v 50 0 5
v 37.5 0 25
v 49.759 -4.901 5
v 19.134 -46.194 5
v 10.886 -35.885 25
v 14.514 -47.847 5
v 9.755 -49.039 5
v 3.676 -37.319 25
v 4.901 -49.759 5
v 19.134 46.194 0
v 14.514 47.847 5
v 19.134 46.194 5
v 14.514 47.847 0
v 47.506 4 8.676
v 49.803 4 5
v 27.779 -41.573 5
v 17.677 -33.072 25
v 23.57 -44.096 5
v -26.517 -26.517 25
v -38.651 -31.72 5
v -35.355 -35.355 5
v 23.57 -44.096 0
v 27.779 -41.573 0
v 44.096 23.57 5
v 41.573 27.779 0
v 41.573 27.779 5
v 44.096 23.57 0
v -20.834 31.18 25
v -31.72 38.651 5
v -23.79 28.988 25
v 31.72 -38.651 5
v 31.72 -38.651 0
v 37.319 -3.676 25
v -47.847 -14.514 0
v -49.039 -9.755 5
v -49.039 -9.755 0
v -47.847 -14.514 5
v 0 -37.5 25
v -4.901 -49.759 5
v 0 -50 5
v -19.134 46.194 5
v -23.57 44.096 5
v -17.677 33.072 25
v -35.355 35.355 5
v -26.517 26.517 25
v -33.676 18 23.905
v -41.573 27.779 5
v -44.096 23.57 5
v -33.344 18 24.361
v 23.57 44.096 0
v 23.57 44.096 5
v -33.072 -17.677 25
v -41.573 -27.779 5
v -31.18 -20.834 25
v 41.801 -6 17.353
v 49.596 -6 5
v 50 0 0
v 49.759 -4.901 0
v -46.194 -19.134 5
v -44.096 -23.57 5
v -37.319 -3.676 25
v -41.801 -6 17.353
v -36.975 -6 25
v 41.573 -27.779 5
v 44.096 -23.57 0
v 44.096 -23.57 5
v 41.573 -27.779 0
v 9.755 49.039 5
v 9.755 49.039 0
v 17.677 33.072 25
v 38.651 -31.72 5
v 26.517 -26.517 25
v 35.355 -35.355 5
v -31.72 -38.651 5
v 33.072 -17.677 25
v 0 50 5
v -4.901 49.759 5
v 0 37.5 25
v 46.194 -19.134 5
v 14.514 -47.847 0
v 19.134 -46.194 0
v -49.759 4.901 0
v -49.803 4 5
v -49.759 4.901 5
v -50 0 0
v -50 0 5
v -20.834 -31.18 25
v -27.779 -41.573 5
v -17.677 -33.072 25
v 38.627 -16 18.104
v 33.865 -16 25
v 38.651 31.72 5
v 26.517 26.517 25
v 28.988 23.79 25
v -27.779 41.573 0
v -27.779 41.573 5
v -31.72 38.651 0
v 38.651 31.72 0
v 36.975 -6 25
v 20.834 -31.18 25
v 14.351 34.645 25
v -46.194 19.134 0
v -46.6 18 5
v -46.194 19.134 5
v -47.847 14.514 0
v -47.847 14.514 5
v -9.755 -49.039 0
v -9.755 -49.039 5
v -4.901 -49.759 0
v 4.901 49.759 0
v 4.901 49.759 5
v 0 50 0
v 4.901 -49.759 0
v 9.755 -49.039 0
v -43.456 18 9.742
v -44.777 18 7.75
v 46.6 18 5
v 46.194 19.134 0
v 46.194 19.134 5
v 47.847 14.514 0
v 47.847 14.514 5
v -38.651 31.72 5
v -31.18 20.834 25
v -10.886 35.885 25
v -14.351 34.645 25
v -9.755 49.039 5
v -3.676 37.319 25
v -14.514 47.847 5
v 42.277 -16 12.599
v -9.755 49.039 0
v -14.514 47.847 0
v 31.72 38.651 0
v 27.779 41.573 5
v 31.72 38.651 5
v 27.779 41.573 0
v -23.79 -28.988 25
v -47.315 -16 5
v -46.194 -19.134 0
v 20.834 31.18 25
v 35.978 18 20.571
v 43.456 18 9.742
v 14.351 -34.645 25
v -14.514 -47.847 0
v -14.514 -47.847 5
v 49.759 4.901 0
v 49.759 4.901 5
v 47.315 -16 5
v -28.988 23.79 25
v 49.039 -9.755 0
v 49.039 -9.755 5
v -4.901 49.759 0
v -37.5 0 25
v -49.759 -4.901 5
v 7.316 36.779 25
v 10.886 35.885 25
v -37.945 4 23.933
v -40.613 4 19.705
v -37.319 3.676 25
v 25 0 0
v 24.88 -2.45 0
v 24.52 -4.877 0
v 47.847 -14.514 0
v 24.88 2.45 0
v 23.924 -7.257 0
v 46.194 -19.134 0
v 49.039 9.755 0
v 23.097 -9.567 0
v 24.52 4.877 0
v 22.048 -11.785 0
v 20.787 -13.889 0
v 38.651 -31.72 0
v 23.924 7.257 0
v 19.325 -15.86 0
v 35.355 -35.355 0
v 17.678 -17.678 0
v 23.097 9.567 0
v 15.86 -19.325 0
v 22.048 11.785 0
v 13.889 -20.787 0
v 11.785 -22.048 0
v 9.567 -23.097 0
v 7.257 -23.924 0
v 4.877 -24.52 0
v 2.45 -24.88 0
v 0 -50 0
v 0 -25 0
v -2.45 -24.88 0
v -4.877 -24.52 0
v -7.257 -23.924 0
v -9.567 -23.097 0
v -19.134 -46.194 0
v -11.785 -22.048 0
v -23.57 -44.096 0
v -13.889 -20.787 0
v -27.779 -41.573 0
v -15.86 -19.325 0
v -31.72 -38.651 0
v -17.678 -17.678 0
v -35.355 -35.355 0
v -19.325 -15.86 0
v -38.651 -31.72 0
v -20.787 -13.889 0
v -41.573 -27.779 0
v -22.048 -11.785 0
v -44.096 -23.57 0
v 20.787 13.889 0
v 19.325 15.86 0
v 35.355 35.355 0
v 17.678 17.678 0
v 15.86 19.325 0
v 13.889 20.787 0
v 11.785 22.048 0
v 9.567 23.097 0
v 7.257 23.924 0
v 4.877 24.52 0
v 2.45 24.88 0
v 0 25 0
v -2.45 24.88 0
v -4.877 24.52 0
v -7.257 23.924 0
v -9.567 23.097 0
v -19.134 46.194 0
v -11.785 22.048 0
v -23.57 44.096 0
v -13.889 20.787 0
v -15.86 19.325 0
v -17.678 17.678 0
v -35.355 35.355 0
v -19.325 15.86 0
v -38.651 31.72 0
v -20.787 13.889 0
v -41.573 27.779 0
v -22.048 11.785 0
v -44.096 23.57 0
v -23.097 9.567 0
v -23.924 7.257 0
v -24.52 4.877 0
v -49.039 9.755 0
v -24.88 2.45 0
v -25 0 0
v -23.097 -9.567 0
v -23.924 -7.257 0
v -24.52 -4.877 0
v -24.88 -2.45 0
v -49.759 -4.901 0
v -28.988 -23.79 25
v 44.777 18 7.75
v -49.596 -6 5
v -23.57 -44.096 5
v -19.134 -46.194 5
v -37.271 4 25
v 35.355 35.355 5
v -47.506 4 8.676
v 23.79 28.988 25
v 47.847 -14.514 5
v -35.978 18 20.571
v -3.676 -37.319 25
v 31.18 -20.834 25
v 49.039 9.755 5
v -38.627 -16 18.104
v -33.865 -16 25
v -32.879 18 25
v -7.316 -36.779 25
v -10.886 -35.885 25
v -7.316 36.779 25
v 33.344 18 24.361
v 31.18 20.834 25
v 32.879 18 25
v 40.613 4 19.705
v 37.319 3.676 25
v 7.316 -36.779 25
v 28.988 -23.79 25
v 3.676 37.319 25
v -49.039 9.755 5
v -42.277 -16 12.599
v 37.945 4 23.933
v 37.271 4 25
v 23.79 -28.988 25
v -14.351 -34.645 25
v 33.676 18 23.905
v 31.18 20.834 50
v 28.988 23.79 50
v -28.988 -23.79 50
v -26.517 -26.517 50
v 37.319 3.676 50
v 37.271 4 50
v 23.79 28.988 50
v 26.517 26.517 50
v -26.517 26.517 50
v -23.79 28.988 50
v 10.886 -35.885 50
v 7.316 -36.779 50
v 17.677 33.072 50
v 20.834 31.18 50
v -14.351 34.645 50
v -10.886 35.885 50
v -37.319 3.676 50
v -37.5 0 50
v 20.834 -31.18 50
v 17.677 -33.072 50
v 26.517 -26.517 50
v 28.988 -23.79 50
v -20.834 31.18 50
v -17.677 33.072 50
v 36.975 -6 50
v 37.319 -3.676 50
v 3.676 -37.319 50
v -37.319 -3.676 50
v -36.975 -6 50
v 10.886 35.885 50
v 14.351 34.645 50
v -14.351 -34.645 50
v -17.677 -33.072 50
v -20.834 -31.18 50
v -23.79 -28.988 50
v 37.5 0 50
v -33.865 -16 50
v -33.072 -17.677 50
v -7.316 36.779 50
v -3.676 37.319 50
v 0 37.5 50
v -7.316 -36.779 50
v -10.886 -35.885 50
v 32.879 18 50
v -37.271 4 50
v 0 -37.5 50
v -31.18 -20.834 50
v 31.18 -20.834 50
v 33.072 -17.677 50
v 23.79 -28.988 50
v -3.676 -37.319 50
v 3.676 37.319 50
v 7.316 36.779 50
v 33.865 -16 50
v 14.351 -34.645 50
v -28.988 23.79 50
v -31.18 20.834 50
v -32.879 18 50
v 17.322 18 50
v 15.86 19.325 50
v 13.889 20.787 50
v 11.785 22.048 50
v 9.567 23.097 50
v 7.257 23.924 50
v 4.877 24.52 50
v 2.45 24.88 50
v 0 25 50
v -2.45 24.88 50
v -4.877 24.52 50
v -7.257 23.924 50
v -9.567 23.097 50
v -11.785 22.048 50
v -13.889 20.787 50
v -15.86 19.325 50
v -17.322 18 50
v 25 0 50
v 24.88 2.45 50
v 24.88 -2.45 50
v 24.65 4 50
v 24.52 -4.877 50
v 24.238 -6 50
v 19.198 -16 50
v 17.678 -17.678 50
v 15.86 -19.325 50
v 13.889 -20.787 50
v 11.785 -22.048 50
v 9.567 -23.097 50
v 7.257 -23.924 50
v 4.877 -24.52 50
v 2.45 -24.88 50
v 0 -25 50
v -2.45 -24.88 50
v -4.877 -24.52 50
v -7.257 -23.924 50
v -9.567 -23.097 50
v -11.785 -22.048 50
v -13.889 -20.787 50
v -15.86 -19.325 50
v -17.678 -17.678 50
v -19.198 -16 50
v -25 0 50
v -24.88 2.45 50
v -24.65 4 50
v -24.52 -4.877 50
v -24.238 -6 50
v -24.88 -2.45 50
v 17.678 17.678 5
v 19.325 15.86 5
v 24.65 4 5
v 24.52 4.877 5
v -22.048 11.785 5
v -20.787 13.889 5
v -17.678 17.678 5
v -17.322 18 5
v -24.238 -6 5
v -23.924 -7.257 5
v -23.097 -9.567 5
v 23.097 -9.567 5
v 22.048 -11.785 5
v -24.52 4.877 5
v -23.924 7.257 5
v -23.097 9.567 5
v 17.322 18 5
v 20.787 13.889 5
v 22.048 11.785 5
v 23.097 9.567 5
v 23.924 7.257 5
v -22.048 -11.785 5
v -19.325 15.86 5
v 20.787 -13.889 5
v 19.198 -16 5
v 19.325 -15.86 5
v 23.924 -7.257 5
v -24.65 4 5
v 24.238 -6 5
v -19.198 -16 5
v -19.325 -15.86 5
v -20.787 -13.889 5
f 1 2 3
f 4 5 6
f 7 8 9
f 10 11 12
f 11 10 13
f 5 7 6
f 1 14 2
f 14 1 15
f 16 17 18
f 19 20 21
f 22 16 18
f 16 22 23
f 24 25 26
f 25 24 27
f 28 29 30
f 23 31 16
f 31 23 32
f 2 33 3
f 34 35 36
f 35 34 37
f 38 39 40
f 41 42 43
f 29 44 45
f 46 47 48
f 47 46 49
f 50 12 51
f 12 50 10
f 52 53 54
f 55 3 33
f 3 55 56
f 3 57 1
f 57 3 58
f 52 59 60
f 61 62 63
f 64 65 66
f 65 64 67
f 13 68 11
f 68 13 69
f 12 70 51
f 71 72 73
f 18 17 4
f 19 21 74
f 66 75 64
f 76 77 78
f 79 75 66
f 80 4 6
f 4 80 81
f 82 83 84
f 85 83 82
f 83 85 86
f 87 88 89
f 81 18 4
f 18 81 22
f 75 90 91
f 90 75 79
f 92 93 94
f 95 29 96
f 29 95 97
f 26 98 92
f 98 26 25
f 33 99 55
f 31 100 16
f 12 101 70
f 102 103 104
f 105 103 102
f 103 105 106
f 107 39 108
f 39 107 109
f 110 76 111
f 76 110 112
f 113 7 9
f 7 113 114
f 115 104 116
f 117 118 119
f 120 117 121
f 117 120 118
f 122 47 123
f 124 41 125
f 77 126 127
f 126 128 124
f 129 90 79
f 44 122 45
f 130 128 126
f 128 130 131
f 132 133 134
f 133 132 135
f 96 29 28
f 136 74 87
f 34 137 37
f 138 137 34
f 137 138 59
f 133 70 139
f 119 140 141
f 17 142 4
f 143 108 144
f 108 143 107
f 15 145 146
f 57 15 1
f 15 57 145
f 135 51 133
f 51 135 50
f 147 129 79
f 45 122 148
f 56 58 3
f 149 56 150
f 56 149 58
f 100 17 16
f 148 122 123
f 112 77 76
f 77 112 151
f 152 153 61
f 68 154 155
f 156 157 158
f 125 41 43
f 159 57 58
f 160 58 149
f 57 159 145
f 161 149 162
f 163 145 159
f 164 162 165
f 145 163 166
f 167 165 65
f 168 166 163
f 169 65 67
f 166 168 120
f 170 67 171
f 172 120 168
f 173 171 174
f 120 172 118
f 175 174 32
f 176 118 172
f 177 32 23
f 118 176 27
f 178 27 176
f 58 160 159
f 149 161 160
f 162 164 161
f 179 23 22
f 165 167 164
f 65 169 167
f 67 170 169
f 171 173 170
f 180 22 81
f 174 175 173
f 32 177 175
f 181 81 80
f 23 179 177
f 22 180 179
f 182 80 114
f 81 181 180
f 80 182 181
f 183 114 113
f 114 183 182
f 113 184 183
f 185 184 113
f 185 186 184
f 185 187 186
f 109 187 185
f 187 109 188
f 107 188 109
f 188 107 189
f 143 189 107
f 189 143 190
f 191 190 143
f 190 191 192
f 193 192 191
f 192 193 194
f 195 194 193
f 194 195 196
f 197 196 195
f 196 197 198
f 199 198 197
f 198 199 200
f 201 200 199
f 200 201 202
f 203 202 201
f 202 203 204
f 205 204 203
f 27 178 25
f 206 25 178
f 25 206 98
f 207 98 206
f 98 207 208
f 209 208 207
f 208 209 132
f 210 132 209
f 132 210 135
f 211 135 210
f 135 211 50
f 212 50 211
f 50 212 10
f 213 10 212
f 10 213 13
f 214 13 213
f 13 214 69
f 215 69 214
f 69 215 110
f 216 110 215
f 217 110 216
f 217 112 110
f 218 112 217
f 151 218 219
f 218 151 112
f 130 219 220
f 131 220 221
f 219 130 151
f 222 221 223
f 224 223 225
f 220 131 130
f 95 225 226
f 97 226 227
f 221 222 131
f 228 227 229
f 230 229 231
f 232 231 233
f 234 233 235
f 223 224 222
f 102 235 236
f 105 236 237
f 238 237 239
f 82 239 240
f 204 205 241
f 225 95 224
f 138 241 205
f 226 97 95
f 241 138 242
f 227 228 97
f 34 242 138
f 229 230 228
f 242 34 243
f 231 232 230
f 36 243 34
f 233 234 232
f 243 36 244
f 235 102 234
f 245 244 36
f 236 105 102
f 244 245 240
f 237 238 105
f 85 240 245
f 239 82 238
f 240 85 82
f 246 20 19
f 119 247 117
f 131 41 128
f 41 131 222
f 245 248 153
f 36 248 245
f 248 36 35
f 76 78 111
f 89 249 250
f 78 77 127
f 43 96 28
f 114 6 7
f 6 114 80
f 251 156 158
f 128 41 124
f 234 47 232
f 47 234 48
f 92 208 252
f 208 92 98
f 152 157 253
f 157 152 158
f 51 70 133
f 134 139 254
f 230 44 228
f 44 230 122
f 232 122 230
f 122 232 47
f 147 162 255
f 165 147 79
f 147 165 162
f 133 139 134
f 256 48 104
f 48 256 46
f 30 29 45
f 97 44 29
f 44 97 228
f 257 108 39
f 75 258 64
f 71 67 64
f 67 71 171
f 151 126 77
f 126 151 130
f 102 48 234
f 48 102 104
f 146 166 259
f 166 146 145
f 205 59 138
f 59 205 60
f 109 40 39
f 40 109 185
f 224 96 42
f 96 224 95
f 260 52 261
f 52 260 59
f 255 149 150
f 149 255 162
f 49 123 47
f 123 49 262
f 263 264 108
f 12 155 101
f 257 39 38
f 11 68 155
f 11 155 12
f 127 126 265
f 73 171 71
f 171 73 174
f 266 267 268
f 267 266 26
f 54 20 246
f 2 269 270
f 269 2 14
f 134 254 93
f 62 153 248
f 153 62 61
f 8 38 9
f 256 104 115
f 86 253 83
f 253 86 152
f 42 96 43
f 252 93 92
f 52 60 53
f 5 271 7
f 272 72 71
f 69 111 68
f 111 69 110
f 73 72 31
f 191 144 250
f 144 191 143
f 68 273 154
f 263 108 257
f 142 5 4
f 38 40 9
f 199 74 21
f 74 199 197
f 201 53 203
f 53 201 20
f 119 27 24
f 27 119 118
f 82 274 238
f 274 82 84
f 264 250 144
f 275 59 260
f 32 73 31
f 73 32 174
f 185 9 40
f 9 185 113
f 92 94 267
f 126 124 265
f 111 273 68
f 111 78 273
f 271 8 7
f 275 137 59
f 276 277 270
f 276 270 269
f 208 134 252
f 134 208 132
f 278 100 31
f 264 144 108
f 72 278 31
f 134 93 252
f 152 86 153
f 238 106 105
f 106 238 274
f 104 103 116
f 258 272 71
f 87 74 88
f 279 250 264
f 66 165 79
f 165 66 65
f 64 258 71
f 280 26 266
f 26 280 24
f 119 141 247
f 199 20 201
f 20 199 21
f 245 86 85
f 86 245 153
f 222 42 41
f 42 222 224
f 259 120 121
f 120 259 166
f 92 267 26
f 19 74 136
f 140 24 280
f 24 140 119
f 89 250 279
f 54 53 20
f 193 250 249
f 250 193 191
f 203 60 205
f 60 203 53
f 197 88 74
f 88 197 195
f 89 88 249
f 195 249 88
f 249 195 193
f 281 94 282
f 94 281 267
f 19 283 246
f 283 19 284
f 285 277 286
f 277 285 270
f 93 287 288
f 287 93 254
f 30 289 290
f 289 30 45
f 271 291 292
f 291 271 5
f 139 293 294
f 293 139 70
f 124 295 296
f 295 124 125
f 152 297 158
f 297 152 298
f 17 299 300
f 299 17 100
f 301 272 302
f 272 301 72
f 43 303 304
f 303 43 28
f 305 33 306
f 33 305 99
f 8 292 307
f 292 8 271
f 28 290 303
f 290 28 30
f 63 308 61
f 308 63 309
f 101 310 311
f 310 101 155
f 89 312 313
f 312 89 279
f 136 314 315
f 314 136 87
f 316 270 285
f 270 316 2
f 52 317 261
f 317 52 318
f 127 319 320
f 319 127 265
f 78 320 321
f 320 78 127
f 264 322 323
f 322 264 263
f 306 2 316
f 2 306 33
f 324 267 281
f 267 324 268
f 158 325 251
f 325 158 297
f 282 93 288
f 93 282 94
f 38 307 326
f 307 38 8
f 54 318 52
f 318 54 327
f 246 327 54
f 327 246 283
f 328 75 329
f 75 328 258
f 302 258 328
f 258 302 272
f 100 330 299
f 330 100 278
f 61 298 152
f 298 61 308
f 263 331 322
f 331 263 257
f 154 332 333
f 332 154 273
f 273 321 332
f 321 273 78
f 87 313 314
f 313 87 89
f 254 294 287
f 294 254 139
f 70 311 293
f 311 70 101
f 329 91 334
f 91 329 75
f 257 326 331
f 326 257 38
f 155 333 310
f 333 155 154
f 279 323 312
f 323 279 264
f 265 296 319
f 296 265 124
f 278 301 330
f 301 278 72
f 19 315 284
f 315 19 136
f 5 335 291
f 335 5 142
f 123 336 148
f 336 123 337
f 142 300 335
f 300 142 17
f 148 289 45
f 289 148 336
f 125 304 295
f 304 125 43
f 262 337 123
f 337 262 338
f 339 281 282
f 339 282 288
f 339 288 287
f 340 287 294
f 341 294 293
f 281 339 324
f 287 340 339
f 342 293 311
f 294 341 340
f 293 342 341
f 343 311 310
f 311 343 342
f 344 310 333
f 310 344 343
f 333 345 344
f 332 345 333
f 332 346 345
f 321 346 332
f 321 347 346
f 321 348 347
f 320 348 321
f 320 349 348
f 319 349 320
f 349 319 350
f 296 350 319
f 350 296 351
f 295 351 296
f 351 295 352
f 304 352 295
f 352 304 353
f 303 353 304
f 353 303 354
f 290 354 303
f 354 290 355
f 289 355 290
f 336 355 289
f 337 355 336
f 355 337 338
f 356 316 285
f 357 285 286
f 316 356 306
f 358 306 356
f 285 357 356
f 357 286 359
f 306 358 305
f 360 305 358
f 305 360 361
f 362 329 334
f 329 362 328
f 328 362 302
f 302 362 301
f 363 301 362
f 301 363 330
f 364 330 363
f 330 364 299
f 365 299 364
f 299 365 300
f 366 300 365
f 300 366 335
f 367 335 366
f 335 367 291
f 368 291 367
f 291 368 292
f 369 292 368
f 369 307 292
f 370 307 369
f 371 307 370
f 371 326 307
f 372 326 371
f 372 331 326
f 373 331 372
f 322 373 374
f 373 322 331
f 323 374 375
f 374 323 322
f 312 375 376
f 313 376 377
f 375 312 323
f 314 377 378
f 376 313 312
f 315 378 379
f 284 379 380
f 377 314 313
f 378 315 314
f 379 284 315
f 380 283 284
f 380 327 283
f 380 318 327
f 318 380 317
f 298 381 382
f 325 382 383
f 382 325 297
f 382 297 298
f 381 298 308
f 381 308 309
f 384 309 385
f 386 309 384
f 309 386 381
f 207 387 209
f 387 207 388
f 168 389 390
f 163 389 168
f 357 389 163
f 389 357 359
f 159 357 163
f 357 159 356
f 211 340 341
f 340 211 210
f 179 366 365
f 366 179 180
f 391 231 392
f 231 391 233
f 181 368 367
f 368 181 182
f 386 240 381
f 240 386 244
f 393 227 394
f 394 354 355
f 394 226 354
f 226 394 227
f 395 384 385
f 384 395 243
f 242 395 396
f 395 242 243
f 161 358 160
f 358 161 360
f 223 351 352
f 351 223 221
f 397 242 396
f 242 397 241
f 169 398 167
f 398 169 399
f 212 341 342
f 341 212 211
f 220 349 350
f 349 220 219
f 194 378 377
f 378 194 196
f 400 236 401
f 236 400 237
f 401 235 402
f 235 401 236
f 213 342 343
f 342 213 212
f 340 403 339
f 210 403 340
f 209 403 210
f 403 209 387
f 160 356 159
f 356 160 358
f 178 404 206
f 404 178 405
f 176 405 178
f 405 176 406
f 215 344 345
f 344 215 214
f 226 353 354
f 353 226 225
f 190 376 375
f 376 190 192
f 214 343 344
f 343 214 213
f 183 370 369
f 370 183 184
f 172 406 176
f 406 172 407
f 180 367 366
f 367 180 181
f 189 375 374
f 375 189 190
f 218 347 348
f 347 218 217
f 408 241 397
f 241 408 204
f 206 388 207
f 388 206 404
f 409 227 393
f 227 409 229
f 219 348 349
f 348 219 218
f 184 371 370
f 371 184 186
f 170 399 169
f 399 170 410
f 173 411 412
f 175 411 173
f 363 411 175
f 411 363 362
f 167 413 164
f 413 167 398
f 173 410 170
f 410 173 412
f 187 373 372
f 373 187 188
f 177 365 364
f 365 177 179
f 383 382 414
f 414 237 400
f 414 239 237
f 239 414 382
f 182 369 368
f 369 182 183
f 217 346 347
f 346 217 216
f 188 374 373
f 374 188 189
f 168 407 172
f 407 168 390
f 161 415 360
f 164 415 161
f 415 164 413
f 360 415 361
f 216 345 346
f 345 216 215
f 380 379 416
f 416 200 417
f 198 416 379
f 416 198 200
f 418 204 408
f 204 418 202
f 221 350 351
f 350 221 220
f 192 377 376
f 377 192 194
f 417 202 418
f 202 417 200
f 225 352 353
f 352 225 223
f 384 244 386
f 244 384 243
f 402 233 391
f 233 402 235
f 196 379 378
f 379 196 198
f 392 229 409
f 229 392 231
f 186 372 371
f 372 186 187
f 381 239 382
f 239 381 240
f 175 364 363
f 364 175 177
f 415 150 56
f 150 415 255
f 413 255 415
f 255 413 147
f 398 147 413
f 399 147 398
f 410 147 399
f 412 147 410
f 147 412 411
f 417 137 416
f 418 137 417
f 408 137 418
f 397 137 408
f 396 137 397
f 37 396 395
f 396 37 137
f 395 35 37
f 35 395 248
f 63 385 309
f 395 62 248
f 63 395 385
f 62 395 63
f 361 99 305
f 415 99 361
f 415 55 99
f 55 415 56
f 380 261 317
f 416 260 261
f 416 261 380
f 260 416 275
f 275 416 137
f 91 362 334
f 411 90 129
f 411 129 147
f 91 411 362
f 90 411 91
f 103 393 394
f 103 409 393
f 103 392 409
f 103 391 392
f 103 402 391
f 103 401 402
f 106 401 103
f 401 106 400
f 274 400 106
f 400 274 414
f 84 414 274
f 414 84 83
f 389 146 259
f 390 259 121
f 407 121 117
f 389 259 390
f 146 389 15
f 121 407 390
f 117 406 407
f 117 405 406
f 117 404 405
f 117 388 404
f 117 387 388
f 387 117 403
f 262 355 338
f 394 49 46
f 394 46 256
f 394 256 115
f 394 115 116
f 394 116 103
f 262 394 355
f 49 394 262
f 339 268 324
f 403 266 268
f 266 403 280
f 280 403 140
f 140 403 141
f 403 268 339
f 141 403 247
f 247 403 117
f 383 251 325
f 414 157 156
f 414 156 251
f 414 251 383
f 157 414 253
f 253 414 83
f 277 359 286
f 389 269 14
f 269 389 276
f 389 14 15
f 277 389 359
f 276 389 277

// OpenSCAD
h1 = 5;
h2 = 25;
h3 = 50;

d_outer = 100;
d_inner = 75;
d_hole = 50;

slot_1_width = 10;
slot_2_width = 14;

$fn = 64;

module Slot(w, z, y)
{
  translate([0, y, 50 + z])
  {
    cube([100, w, 100], center=true);
  }
}

difference()
{
  union()
  {
    hull()
    {
      cylinder(d=d_outer, h=h1);
      cylinder(d=d_inner, h=h2);
    }

    cylinder(d=d_inner, h=h3);
  }

  translate([0, 0, -1])
  {
    cylinder(d=d_hole, h=h3 + 2);
  }

  Slot(slot_1_width, 5, -11);
  Slot(slot_2_width, 5, 11);
}
